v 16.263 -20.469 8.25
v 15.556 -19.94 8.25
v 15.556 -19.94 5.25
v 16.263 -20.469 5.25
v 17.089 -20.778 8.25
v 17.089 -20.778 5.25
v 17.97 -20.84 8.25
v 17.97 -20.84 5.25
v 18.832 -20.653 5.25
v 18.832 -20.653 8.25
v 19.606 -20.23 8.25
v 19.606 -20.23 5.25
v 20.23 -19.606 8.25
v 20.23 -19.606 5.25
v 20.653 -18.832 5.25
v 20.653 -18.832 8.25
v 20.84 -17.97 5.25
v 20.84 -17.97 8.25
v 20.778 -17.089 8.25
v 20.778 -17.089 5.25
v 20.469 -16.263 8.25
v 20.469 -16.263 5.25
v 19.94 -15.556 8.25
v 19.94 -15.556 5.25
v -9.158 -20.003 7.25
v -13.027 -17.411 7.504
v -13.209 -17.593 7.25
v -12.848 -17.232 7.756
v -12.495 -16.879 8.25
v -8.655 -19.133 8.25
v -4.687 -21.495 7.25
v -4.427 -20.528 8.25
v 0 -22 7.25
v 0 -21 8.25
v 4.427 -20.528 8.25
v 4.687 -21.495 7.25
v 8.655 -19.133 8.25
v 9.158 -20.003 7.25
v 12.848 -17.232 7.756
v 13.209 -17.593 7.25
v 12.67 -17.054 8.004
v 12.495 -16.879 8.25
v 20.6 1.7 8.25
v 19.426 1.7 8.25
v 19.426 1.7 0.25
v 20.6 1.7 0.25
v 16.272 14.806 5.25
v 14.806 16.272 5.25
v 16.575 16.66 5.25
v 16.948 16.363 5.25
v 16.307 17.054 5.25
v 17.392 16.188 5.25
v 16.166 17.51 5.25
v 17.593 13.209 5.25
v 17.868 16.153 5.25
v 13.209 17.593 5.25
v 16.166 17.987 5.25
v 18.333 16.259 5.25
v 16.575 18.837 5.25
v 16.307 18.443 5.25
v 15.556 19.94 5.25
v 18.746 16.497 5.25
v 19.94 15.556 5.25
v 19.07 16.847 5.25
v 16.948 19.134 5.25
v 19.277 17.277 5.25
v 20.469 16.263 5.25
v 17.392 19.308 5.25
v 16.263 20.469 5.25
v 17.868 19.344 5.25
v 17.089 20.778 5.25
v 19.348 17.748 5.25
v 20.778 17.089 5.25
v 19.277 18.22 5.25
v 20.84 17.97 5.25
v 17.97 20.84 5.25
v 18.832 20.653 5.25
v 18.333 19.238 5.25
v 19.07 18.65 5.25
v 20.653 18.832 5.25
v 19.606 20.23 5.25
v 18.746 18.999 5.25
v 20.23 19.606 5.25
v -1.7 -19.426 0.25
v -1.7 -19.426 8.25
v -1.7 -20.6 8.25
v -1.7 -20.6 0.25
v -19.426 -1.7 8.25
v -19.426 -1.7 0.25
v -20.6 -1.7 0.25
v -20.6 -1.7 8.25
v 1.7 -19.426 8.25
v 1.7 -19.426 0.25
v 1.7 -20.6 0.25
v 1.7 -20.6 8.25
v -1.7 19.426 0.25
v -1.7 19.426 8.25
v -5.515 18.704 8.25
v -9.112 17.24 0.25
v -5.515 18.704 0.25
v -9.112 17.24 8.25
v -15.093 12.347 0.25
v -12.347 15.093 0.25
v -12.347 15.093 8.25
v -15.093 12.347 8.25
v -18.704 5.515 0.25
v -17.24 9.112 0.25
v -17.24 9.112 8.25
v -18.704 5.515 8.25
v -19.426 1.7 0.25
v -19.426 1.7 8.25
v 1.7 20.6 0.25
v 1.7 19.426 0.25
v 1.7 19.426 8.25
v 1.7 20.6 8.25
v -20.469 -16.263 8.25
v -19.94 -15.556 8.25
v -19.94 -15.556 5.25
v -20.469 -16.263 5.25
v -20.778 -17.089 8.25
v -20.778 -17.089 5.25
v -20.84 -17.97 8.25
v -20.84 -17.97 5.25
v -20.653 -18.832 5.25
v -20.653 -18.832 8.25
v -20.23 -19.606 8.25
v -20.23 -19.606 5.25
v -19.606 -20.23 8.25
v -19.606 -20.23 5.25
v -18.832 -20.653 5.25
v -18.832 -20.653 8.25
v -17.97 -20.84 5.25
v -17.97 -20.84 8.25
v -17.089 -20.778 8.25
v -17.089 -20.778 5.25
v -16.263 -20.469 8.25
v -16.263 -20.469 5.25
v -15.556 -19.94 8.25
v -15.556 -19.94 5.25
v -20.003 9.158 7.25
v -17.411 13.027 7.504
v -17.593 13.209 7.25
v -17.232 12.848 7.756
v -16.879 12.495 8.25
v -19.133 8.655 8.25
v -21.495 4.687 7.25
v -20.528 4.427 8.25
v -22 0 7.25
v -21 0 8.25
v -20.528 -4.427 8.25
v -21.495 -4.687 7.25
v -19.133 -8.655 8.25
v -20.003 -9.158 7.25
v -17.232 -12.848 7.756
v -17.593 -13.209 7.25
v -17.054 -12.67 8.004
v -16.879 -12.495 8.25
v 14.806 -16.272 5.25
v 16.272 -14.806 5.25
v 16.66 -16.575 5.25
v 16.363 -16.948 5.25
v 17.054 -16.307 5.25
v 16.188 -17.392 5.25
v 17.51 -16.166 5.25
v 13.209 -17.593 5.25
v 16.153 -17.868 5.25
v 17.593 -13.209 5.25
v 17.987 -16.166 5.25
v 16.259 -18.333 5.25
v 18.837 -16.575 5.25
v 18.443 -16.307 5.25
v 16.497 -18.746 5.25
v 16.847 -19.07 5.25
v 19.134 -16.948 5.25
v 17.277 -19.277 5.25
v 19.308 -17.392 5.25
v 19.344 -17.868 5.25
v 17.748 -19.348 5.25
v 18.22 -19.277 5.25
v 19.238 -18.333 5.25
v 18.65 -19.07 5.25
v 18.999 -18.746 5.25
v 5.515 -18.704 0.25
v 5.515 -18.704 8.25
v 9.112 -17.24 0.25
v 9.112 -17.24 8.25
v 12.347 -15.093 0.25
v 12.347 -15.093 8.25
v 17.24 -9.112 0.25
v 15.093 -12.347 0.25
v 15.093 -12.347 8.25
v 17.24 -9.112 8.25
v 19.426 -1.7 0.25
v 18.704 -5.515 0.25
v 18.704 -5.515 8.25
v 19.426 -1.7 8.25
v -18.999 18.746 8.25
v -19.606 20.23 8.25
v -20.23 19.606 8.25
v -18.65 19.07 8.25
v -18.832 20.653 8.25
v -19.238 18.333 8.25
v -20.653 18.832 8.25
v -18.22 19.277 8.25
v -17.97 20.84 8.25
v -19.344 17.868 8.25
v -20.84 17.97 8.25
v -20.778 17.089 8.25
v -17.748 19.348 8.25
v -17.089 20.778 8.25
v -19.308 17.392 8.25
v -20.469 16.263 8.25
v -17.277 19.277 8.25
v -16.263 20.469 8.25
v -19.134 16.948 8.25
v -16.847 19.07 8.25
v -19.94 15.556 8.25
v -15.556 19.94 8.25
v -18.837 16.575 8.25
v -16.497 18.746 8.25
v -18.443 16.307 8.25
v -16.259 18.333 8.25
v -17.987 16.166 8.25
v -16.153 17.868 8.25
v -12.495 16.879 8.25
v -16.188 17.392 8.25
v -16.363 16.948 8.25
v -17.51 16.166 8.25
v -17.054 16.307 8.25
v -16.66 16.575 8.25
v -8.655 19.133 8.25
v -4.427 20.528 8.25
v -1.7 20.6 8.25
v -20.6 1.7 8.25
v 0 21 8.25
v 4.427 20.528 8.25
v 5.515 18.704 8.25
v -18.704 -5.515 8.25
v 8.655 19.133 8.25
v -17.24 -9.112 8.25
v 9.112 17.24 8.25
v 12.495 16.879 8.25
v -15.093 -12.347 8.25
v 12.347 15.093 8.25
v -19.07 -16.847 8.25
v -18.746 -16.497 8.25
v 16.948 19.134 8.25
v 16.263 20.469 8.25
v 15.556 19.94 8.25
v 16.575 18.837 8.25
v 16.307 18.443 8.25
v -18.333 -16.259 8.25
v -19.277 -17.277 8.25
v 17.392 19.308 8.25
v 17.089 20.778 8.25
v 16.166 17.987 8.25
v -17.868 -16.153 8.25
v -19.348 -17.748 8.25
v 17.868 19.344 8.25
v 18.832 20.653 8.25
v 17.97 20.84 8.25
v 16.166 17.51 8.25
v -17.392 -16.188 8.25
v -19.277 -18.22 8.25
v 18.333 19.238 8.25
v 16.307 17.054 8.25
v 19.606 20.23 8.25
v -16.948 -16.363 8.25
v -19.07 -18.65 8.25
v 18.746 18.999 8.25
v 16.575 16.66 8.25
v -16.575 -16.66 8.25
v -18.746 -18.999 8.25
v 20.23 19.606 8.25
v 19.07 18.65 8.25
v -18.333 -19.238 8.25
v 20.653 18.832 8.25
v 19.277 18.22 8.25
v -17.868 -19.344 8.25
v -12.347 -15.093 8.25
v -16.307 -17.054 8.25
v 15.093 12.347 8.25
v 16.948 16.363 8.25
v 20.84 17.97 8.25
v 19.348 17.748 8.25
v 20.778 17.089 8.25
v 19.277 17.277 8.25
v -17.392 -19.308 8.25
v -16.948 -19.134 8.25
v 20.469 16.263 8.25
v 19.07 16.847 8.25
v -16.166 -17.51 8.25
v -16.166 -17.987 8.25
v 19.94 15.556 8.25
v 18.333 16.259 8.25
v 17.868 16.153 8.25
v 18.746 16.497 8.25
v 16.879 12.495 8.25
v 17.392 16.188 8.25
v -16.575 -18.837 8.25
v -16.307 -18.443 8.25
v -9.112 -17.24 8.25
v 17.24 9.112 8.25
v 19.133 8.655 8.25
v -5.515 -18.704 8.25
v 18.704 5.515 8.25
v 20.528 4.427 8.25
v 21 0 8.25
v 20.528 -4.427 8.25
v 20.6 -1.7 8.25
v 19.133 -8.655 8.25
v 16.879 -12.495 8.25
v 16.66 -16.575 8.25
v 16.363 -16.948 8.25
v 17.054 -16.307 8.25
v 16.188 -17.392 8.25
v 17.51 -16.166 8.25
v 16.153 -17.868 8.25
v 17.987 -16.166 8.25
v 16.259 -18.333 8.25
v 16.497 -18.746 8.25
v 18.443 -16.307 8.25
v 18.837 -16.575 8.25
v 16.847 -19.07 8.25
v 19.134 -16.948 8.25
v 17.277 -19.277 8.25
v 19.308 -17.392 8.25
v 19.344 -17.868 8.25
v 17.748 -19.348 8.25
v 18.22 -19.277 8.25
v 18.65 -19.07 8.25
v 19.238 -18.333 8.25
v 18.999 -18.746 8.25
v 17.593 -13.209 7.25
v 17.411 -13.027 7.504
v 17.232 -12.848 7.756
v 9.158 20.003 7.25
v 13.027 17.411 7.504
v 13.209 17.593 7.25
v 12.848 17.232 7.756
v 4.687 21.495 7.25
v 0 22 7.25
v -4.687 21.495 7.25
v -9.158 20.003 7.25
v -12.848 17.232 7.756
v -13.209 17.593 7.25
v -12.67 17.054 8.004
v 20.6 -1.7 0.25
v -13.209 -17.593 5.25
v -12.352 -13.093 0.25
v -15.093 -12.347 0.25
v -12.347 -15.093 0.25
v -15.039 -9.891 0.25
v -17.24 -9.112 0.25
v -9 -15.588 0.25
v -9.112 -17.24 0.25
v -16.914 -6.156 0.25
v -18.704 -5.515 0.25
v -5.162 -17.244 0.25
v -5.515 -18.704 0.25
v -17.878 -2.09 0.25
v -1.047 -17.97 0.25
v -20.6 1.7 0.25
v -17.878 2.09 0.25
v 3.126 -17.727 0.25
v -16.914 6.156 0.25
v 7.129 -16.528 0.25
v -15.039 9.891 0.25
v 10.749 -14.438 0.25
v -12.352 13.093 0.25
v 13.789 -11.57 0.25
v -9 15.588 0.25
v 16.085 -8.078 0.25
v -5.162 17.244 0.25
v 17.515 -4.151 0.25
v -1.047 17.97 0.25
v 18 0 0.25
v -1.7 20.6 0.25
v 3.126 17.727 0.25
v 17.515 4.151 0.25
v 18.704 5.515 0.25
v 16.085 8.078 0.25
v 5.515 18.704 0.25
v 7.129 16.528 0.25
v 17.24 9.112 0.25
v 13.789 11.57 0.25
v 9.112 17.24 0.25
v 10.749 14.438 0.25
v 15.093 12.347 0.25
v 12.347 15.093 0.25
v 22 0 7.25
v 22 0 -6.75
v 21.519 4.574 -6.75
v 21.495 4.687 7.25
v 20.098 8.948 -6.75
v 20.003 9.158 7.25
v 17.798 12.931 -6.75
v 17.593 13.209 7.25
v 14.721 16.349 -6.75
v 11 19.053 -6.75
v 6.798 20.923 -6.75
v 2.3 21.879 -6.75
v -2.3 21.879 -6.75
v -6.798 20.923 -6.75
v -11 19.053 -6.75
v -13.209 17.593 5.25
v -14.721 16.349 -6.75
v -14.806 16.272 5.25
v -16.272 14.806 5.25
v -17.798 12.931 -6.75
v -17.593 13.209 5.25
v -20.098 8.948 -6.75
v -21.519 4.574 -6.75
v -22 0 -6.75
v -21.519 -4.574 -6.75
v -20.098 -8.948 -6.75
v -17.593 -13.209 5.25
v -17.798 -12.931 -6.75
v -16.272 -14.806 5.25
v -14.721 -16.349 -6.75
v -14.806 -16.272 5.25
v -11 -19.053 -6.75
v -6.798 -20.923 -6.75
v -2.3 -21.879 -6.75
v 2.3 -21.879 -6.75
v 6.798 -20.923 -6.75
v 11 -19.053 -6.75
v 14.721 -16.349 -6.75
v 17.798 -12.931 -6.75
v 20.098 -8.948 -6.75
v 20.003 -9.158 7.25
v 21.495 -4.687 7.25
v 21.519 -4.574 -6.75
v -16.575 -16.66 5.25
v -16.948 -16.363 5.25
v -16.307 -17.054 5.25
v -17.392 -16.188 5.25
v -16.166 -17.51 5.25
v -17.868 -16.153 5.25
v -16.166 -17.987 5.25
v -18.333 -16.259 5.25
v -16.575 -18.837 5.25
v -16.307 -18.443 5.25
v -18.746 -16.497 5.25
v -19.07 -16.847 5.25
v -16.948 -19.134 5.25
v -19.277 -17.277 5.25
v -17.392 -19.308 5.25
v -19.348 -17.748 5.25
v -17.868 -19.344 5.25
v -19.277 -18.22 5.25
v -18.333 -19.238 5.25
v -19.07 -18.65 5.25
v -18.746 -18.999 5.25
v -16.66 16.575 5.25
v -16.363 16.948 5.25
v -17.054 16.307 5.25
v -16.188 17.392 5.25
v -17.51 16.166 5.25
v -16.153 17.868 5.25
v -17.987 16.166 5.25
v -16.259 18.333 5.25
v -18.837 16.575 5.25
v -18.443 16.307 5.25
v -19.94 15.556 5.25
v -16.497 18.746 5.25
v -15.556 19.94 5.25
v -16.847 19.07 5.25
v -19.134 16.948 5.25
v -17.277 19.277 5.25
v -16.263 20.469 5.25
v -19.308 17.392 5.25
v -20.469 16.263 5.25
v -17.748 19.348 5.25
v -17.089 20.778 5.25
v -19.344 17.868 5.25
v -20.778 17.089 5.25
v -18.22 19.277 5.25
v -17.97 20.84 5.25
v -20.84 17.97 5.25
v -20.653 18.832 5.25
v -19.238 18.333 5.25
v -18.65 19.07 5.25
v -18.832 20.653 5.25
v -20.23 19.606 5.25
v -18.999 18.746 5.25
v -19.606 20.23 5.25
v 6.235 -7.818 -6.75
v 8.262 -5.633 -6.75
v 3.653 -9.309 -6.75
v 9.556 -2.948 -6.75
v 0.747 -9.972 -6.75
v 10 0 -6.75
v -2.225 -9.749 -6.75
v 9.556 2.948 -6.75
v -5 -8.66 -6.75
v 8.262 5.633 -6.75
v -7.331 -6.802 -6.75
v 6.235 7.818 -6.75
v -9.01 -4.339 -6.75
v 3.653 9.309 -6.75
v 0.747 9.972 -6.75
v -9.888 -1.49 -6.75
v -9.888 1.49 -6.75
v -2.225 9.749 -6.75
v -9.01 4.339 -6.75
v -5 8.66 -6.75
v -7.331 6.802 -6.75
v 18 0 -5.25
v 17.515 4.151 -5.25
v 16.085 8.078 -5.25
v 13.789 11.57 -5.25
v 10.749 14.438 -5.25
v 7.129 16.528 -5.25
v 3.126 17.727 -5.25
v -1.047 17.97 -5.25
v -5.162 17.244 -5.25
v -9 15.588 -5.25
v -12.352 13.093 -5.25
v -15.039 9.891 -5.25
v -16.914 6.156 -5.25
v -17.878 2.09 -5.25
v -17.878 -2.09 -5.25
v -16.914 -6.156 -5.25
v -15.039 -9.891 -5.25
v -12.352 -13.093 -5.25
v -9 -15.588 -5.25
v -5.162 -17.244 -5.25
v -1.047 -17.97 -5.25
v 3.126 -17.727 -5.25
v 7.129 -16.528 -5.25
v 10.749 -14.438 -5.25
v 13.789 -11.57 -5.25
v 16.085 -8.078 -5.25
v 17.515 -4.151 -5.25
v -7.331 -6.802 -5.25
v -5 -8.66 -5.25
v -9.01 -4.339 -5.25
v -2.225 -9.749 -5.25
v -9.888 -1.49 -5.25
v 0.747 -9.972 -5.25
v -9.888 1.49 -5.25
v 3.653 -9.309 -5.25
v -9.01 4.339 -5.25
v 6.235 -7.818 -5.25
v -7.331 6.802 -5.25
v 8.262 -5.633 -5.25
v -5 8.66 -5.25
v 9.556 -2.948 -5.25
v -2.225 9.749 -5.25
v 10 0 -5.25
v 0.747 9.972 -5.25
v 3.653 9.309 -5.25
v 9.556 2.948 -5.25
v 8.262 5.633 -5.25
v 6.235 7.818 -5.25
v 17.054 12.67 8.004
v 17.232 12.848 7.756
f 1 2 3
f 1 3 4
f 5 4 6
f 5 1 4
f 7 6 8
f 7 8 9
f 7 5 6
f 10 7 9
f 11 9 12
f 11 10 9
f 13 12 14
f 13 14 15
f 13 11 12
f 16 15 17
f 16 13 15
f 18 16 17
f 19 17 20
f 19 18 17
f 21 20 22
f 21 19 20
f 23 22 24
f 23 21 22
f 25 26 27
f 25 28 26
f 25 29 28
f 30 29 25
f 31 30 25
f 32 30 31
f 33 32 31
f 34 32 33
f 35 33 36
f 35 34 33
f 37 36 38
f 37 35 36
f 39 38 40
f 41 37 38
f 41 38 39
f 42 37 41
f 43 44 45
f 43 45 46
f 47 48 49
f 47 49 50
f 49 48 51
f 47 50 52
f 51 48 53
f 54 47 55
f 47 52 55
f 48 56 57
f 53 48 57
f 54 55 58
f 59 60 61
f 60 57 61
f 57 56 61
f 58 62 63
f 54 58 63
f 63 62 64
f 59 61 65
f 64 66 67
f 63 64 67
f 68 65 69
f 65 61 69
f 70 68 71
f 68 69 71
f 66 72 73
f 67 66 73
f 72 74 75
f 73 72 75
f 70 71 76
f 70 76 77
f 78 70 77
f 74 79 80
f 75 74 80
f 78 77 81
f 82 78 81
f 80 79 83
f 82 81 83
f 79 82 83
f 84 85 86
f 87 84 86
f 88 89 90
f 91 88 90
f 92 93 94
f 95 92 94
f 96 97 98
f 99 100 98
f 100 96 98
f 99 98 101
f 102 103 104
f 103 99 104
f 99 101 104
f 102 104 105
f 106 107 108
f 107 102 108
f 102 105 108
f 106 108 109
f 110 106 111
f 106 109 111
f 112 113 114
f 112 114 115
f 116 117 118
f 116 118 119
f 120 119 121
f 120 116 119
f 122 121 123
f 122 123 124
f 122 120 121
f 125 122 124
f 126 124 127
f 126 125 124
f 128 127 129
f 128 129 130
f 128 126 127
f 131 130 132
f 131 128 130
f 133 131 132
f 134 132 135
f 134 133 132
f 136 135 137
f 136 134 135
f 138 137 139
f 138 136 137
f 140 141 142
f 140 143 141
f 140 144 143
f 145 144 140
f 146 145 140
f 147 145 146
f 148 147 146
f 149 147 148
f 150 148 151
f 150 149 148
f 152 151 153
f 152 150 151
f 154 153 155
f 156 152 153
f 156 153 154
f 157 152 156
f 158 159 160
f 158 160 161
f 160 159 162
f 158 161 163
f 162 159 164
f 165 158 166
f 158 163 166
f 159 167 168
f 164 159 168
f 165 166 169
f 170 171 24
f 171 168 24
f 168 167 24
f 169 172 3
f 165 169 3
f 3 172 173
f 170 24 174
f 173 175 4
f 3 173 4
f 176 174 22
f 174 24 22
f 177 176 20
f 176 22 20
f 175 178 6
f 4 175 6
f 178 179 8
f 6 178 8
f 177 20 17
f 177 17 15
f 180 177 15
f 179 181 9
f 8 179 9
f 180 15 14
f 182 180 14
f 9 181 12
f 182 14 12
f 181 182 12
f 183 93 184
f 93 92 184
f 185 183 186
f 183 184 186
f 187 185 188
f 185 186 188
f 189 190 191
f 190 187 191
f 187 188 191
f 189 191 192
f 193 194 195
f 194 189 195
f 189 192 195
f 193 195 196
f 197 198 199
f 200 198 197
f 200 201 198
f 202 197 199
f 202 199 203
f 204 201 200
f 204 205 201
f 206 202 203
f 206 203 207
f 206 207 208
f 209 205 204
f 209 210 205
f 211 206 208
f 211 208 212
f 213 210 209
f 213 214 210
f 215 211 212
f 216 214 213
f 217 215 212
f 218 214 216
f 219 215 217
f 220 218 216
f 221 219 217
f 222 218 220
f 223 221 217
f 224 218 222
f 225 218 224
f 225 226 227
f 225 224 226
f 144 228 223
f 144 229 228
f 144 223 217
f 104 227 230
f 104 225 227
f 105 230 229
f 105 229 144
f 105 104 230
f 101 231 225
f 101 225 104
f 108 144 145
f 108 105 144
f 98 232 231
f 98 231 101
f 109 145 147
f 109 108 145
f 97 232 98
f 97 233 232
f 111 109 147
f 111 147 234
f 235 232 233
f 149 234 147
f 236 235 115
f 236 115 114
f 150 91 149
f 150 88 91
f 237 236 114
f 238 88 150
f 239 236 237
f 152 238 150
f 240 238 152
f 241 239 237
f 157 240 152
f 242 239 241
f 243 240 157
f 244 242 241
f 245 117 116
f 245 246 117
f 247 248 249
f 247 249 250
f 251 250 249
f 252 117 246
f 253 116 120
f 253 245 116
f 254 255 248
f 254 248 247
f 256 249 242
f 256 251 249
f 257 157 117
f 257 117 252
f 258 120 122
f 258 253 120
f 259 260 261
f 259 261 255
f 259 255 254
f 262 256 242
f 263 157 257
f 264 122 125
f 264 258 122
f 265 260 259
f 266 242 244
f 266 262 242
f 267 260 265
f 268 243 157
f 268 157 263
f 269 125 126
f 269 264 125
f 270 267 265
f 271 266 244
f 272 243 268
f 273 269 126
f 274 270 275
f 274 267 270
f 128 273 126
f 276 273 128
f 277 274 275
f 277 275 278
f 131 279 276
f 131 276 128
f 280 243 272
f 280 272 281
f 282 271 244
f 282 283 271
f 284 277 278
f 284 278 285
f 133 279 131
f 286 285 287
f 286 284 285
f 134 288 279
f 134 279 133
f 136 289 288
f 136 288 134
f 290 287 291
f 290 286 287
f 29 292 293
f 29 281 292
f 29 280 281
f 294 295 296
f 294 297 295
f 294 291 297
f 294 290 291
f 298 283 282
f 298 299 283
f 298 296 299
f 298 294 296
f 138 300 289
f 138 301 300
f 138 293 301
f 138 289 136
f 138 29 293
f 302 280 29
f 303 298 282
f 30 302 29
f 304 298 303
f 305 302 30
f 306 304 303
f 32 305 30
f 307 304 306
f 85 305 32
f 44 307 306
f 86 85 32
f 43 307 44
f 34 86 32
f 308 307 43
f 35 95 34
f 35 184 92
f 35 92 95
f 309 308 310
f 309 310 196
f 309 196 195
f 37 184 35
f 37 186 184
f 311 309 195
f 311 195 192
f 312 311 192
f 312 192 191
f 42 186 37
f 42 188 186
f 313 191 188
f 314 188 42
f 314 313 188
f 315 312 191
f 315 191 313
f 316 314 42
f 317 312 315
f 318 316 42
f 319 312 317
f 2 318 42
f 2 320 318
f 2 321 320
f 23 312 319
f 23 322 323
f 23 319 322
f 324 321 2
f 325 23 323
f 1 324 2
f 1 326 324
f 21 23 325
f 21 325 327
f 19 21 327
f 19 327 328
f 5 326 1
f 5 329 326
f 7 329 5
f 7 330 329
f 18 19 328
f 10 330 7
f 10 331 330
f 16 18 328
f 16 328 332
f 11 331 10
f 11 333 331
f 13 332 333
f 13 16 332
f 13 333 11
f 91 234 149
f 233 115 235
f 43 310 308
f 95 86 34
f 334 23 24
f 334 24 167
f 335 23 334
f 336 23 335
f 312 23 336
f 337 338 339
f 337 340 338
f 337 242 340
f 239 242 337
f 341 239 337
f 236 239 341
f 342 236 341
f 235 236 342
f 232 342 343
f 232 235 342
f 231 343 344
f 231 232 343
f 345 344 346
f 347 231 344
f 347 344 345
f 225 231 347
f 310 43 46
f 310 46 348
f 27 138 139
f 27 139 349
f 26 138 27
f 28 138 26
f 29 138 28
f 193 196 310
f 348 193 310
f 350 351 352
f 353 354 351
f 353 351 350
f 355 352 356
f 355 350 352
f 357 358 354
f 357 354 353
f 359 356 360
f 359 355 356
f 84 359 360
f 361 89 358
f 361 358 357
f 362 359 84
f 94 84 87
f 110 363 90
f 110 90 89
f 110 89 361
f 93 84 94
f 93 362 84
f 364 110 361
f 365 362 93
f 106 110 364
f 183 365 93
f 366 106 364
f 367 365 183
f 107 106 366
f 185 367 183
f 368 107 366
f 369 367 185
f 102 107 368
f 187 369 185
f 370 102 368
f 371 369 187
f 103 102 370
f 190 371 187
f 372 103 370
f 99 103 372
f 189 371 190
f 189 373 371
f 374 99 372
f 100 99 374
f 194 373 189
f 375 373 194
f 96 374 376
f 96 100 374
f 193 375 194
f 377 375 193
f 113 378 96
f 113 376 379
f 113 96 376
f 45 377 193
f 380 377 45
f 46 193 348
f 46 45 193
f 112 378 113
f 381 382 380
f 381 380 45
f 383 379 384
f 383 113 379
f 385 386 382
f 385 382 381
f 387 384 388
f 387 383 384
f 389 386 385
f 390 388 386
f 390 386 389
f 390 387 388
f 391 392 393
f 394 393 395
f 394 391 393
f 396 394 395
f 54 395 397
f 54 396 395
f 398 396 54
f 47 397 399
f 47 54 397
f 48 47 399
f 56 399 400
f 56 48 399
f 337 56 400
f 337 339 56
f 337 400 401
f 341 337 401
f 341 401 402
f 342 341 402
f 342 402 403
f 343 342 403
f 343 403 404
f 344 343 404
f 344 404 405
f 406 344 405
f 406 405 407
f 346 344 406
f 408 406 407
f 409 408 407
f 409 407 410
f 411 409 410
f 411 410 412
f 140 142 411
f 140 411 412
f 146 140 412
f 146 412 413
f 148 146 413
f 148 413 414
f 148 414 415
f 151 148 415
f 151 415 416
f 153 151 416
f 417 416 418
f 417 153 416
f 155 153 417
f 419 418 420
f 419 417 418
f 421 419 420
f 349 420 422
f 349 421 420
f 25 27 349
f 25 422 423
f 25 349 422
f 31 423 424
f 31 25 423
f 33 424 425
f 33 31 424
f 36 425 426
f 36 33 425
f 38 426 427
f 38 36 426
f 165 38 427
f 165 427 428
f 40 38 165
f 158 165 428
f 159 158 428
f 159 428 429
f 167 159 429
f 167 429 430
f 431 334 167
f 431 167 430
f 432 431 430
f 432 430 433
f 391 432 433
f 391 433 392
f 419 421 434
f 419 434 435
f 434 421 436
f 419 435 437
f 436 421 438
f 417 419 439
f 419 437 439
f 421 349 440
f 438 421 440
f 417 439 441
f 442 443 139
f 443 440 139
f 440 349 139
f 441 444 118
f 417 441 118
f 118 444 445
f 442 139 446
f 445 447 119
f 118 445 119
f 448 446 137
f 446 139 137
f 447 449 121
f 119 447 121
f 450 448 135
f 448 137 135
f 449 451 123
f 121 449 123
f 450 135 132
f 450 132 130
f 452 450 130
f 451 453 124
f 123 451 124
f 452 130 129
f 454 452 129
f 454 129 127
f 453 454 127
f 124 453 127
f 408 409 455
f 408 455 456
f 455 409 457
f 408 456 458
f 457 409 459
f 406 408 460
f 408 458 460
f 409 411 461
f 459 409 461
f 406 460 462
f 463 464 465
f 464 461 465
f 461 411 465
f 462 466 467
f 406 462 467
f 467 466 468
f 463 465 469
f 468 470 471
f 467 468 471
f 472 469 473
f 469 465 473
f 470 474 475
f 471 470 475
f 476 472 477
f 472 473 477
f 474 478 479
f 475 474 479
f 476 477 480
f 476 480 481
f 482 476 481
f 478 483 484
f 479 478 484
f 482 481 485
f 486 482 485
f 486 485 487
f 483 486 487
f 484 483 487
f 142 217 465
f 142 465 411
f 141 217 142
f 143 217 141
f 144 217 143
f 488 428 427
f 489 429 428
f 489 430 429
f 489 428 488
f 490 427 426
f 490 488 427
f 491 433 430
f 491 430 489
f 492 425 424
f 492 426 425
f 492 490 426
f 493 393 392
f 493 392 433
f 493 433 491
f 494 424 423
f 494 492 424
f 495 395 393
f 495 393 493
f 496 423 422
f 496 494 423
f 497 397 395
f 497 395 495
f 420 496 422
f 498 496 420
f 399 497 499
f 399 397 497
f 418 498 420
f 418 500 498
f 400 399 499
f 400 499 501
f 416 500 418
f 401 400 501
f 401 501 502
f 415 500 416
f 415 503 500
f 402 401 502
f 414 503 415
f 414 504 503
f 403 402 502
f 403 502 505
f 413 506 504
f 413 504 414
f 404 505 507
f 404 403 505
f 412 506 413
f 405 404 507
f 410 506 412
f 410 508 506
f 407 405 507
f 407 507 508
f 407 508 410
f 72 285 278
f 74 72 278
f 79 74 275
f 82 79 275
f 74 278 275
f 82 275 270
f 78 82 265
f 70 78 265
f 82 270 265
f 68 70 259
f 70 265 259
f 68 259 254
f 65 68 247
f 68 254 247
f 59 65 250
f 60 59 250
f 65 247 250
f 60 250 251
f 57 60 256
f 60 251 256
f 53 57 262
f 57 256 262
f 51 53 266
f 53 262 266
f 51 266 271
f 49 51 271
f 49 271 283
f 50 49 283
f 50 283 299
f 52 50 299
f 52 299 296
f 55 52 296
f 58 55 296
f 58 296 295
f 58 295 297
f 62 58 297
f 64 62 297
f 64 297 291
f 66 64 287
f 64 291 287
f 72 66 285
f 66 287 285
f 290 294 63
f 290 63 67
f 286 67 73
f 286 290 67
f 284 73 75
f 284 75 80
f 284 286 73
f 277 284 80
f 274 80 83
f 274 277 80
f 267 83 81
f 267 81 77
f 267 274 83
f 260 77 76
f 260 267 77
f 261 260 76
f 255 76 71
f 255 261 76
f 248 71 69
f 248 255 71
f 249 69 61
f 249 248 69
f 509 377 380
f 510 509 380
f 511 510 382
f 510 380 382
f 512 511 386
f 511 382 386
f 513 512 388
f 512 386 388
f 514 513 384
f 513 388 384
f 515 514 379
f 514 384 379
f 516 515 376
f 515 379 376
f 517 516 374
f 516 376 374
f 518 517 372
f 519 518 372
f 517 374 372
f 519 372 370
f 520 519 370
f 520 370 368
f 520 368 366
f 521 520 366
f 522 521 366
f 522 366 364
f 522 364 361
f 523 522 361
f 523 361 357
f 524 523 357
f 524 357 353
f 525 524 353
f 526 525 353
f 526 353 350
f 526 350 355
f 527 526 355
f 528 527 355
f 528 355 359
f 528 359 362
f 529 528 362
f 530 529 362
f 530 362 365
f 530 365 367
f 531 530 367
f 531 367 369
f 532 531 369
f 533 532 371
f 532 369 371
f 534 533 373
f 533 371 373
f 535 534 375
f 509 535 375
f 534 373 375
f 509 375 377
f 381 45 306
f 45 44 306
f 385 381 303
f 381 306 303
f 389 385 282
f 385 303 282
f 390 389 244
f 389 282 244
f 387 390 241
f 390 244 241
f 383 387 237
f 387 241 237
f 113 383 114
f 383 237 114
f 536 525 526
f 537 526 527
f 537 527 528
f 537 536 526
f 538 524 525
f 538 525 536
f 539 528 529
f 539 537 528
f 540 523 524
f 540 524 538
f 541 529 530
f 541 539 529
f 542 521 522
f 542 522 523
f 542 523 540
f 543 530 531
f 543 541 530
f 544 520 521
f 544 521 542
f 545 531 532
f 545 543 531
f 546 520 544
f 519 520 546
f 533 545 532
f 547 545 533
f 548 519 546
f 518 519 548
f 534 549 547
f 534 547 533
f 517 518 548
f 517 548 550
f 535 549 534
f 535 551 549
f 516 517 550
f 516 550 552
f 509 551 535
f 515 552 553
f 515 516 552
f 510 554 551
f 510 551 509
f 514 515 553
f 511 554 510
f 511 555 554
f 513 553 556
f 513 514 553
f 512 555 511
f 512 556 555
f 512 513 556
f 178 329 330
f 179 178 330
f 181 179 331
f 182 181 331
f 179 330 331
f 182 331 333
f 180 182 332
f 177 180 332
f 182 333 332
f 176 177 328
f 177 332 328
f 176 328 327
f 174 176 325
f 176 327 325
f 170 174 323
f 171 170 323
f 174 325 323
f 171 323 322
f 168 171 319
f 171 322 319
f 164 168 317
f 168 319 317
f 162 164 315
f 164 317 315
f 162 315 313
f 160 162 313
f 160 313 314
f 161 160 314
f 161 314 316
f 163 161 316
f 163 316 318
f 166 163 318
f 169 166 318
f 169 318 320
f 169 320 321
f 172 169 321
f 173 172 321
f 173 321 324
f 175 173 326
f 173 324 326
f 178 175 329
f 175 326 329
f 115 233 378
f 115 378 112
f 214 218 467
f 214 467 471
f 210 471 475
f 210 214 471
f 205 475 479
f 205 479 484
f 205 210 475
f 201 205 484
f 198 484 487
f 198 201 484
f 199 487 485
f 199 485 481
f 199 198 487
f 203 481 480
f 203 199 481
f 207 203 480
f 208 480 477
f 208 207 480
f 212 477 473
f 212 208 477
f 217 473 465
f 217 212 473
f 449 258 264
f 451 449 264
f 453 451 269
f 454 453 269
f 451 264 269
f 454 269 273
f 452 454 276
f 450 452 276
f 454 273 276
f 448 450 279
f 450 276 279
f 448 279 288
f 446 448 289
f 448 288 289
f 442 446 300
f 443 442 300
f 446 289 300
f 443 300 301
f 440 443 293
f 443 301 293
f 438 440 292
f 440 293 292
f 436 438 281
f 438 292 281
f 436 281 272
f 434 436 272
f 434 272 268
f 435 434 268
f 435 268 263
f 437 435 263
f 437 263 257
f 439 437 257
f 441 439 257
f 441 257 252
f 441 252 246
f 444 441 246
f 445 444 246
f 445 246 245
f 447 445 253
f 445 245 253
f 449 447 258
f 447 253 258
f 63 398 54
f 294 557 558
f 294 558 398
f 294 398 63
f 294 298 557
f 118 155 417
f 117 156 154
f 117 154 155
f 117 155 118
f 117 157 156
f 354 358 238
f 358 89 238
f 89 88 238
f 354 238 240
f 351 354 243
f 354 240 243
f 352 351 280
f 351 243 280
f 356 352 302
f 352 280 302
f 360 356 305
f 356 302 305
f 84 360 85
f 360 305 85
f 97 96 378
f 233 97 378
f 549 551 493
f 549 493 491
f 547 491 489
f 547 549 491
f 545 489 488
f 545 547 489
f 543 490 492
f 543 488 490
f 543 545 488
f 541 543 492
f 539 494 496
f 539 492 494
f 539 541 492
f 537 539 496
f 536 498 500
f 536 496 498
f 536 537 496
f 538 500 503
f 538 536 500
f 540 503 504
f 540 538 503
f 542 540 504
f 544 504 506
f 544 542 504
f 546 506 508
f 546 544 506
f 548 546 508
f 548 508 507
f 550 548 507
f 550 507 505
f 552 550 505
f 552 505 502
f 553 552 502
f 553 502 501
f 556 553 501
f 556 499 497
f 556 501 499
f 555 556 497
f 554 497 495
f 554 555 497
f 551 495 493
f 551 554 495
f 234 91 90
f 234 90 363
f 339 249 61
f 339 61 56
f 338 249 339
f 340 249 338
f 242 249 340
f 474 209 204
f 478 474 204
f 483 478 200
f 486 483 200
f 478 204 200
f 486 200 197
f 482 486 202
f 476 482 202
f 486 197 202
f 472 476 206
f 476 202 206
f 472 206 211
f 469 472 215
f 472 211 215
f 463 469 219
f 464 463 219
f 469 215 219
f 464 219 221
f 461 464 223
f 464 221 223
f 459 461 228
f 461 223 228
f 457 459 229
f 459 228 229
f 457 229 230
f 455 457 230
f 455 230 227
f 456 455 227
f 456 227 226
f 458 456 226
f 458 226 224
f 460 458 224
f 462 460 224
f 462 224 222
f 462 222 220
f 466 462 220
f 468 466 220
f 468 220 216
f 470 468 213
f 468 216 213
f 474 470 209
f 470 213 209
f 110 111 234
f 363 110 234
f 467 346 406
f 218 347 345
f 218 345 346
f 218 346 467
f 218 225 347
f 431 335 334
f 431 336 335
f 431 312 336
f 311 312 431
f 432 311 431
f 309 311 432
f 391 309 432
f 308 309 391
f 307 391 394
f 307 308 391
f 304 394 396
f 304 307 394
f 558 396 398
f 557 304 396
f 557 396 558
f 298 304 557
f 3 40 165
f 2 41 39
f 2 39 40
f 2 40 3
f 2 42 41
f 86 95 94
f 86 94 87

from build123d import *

# Parameters (mm, degrees)
SKETCH1_R               = 22
BOSS_EXTRUDE1_DEPTH     = 8.25
SKETCH2_R               = 18
CUT_EXTRUDE1_DEPTH      = 13.5
SKETCH3_R               = 19.5
CUT_EXTRUDE2_DEPTH      = 8
CUT_EXTRUDE3_DEPTH      = 36.217183306
CUT_EXTRUDE3_DEPTH_BACK = 36.217183306
SKETCH4_R               = 10
SKETCH6_W               = 3.4
SKETCH6_H               = 2.2
CUT_EXTRUDE5_DEPTH      = 8
CIRPATTERN1_COUNT       = 4
CUT_EXTRUDE6_START      = -1.5
SKETCH7_R               = 22
CUT_EXTRUDE6_DEPTH      = 1.5
CHAMFER1_SIZE           = 1
SKETCH8_R               = 1.6
BOSS_EXTRUDE2_DEPTH     = 3
CIRPATTERN2_COUNT       = 4


with BuildPart() as part:
    # Sketch1 → Boss-Extrude1 (new, symmetric)
    with BuildSketch(Plane.XY):
        Circle(SKETCH1_R)
    extrude(amount=BOSS_EXTRUDE1_DEPTH, both=True)

    # Sketch2 → Cut-Extrude1 (cut)
    with BuildSketch(Plane.XY.offset(8.25)):
        Circle(SKETCH2_R)
    extrude(amount=-CUT_EXTRUDE1_DEPTH, mode=Mode.SUBTRACT)

    # Sketch3 → Cut-Extrude2 (cut)
    with BuildSketch(Plane.XY.offset(8.25)):
        Circle(SKETCH3_R)
    extrude(amount=-CUT_EXTRUDE2_DEPTH, mode=Mode.SUBTRACT)

    # Sketch4 → Cut-Extrude3 (cut, two sides: drawn at the far end of the back side and taken through both)
    with BuildSketch(Plane(origin=(0, 0, -8.25), x_dir=(-1, 0, 0), z_dir=(0, 0, -1)).offset(-CUT_EXTRUDE3_DEPTH_BACK)):
        with Locations(Location((0, 0, 0), (0, 0, 180))):
            Circle(SKETCH4_R)
    extrude(amount=CUT_EXTRUDE3_DEPTH + CUT_EXTRUDE3_DEPTH_BACK, mode=Mode.SUBTRACT)

    # Sketch6 → Cut-Extrude5 (cut)
    with BuildSketch(Plane.XY.offset(8.25)):
        with Locations((0, 19.5)):
            Rectangle(SKETCH6_W, SKETCH6_H)
    cut_extrude5 = extrude(amount=-CUT_EXTRUDE5_DEPTH, mode=Mode.SUBTRACT)

    # CirPattern1: Cut-Extrude5 ×4 about axis
    cirpattern1_axis = Axis((0, 0, 0), (0, 0, 1))
    for i in range(1, CIRPATTERN1_COUNT):
        add(cut_extrude5.rotate(cirpattern1_axis, i * 360 / CIRPATTERN1_COUNT), mode=Mode.SUBTRACT)

    # Sketch7 → Cut-Extrude6 (cut)
    with BuildSketch(Plane(origin=(0, 0, -8.25), x_dir=(-1, 0, 0), z_dir=(0, 0, -1)).offset(CUT_EXTRUDE6_START)):
        Circle(SKETCH7_R)
    extrude(amount=CUT_EXTRUDE6_DEPTH, mode=Mode.SUBTRACT)

    # Chamfer1
    chamfer1_edges = [part.edges().sort_by_distance(p)[0] for p in [
        (-22, 0, 8.25),
    ]]
    chamfer(chamfer1_edges, length=CHAMFER1_SIZE)

    # Sketch8 → Boss-Extrude2 (add)
    with BuildSketch(Plane.XY.offset(8.25)):
        with BuildLine():
            Line((15.556349186, 19.940411229), (12.494527459, 16.878589502))
            Line((12.494527459, 16.878589502), (16.878589502, 12.494527459))
            Line((16.878589502, 12.494527459), (19.940411229, 15.556349186))
            ThreePointArc((19.940411229, 15.556349186), (19.940411229, 19.940411229), (15.556349186, 19.940411229))
        make_face()
        with Locations((17.748380208, 17.748380208)):
            Circle(SKETCH8_R, mode=Mode.SUBTRACT)
    boss_extrude2 = extrude(amount=-BOSS_EXTRUDE2_DEPTH)

    # CirPattern2: Boss-Extrude2 ×4 about axis
    cirpattern2_axis = Axis((0, 0, 0), (0, 0, 1))
    for i in range(1, CIRPATTERN2_COUNT):
        add(boss_extrude2.rotate(cirpattern2_axis, i * 360 / CIRPATTERN2_COUNT))


solid = part.part
